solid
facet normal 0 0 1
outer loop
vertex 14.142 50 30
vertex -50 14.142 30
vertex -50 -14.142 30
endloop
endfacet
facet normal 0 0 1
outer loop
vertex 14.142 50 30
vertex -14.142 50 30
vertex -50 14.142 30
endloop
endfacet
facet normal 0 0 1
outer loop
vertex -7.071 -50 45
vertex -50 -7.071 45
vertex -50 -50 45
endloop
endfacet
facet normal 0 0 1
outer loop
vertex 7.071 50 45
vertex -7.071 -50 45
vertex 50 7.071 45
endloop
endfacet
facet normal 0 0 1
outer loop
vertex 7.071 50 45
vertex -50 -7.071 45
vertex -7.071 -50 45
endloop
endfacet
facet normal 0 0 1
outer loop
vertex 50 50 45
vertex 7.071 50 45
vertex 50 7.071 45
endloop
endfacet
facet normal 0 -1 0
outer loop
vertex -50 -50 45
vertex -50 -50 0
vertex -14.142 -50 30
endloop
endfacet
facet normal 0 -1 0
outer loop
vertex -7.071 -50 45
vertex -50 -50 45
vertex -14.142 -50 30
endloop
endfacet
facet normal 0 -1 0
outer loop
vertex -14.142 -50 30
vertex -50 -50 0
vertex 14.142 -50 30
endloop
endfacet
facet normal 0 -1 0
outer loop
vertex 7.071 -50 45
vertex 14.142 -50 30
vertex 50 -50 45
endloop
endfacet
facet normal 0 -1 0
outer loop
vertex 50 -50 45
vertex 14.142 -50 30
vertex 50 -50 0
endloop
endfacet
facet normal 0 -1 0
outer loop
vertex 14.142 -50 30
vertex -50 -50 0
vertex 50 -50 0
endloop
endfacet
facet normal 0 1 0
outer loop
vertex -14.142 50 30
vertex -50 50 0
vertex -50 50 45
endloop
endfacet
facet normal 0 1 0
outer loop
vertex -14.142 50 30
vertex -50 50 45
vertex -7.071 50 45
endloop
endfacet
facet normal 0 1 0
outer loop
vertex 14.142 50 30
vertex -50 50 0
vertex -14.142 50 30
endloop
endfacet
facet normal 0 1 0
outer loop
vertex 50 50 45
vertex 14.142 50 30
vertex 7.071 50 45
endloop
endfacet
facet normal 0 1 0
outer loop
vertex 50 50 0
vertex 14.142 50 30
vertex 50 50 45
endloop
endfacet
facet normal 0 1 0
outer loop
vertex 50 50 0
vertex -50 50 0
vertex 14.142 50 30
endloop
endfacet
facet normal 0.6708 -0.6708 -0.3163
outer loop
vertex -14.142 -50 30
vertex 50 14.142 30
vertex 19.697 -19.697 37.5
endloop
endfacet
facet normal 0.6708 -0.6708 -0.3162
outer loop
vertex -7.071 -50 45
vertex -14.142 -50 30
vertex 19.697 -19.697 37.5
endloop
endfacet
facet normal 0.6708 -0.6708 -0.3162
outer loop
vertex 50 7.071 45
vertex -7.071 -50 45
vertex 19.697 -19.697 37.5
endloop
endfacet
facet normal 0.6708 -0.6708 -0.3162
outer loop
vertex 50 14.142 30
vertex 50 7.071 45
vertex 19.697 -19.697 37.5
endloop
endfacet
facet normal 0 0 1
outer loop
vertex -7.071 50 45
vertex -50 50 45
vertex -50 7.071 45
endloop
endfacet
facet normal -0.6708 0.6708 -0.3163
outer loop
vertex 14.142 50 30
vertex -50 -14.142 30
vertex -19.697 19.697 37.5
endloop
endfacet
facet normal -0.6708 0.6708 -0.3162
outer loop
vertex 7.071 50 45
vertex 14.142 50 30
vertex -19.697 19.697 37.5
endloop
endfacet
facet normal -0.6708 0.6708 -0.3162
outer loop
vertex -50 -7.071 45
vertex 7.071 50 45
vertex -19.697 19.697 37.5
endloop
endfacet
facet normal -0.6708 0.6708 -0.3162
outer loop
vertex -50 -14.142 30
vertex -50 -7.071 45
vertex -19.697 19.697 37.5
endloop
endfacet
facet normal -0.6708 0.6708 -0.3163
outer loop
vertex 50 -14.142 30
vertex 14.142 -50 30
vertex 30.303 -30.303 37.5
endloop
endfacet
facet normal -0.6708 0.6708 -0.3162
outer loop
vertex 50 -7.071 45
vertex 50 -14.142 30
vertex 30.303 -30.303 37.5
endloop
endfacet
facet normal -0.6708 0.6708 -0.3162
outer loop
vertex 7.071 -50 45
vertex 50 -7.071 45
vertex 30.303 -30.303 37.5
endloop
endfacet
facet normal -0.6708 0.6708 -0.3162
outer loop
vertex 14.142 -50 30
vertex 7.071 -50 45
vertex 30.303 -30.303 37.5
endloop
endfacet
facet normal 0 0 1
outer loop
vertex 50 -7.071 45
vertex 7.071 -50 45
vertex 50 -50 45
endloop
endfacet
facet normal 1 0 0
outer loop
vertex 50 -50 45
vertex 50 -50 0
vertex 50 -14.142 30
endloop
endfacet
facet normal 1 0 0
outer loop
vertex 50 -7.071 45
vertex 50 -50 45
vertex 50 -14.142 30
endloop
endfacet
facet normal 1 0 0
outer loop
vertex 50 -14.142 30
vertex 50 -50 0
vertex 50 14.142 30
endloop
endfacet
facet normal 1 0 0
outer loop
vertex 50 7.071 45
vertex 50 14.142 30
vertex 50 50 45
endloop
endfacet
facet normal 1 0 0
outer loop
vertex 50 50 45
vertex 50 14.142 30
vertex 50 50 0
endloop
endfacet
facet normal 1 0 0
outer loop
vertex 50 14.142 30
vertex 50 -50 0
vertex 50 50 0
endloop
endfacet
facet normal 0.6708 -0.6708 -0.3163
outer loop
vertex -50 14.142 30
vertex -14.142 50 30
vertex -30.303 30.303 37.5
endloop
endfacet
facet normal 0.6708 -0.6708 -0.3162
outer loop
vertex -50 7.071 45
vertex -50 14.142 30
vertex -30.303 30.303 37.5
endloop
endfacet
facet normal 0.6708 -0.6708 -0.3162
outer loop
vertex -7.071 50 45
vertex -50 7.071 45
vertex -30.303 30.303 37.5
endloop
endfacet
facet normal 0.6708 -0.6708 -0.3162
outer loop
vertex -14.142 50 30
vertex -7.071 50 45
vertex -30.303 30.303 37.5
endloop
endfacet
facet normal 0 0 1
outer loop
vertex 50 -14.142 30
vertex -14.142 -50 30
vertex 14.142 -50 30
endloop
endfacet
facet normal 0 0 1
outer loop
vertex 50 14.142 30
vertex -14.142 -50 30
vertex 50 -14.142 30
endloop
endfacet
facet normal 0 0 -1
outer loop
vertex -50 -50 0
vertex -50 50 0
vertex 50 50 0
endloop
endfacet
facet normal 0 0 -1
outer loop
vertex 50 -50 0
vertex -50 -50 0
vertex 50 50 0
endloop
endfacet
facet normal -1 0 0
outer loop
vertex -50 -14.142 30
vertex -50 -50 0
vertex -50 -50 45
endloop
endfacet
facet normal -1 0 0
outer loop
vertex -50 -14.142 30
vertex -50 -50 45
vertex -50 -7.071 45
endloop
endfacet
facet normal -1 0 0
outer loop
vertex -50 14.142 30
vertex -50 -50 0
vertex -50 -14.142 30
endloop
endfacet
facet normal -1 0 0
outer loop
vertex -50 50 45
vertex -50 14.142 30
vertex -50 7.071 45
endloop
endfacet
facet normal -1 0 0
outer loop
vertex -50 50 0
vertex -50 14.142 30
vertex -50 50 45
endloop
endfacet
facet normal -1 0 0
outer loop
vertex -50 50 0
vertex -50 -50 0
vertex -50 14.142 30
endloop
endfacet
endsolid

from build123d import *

# Parameters (mm, degrees)
F0_W     = 100
F0_H     = 100
F1_DEPTH = 45
F6_DEPTH = 15


with BuildPart() as f1:
    # F0 (on Top) → F1 (new body)
    with BuildSketch(Plane.XY):
        Rectangle(F0_W, F0_H)
    extrude(amount=F1_DEPTH)

    # F5 (on offset) → F6 (cut)
    with BuildSketch(Plane.XY.offset(45)):
        Polygon((50, -7.071068), (50, 7.071068), (-7.071068, -50), (7.071068, -50), align=None)
        Polygon((7.071068, 50), (-7.071068, 50), (-50, 7.071068), (-50, -7.071068), align=None)
    extrude(amount=-F6_DEPTH, mode=Mode.SUBTRACT)

    # F3 (on offset) → F7 section 0
    with BuildSketch(Plane.XY.offset(30)):
        Polygon((14.142136, -50), (50, -14.142136), (50, 14.142136), (-14.142136, -50), align=None)
    # F5 (on offset) → F7 section 1
    with BuildSketch(Plane.XY.offset(45)):
        Polygon((50, -7.071068), (50, 7.071068), (-7.071068, -50), (7.071068, -50), align=None)
    loft(mode=Mode.SUBTRACT)

    # F3 (on offset) → F8 section 0
    with BuildSketch(Plane.XY.offset(30)):
        Polygon((-50, -14.142136), (14.142136, 50), (-14.142136, 50), (-50, 14.142136), align=None)
    # F5 (on offset) → F8 section 1
    with BuildSketch(Plane.XY.offset(45)):
        Polygon((7.071068, 50), (-7.071068, 50), (-50, 7.071068), (-50, -7.071068), align=None)
    loft(mode=Mode.SUBTRACT)


solid = f1.part
